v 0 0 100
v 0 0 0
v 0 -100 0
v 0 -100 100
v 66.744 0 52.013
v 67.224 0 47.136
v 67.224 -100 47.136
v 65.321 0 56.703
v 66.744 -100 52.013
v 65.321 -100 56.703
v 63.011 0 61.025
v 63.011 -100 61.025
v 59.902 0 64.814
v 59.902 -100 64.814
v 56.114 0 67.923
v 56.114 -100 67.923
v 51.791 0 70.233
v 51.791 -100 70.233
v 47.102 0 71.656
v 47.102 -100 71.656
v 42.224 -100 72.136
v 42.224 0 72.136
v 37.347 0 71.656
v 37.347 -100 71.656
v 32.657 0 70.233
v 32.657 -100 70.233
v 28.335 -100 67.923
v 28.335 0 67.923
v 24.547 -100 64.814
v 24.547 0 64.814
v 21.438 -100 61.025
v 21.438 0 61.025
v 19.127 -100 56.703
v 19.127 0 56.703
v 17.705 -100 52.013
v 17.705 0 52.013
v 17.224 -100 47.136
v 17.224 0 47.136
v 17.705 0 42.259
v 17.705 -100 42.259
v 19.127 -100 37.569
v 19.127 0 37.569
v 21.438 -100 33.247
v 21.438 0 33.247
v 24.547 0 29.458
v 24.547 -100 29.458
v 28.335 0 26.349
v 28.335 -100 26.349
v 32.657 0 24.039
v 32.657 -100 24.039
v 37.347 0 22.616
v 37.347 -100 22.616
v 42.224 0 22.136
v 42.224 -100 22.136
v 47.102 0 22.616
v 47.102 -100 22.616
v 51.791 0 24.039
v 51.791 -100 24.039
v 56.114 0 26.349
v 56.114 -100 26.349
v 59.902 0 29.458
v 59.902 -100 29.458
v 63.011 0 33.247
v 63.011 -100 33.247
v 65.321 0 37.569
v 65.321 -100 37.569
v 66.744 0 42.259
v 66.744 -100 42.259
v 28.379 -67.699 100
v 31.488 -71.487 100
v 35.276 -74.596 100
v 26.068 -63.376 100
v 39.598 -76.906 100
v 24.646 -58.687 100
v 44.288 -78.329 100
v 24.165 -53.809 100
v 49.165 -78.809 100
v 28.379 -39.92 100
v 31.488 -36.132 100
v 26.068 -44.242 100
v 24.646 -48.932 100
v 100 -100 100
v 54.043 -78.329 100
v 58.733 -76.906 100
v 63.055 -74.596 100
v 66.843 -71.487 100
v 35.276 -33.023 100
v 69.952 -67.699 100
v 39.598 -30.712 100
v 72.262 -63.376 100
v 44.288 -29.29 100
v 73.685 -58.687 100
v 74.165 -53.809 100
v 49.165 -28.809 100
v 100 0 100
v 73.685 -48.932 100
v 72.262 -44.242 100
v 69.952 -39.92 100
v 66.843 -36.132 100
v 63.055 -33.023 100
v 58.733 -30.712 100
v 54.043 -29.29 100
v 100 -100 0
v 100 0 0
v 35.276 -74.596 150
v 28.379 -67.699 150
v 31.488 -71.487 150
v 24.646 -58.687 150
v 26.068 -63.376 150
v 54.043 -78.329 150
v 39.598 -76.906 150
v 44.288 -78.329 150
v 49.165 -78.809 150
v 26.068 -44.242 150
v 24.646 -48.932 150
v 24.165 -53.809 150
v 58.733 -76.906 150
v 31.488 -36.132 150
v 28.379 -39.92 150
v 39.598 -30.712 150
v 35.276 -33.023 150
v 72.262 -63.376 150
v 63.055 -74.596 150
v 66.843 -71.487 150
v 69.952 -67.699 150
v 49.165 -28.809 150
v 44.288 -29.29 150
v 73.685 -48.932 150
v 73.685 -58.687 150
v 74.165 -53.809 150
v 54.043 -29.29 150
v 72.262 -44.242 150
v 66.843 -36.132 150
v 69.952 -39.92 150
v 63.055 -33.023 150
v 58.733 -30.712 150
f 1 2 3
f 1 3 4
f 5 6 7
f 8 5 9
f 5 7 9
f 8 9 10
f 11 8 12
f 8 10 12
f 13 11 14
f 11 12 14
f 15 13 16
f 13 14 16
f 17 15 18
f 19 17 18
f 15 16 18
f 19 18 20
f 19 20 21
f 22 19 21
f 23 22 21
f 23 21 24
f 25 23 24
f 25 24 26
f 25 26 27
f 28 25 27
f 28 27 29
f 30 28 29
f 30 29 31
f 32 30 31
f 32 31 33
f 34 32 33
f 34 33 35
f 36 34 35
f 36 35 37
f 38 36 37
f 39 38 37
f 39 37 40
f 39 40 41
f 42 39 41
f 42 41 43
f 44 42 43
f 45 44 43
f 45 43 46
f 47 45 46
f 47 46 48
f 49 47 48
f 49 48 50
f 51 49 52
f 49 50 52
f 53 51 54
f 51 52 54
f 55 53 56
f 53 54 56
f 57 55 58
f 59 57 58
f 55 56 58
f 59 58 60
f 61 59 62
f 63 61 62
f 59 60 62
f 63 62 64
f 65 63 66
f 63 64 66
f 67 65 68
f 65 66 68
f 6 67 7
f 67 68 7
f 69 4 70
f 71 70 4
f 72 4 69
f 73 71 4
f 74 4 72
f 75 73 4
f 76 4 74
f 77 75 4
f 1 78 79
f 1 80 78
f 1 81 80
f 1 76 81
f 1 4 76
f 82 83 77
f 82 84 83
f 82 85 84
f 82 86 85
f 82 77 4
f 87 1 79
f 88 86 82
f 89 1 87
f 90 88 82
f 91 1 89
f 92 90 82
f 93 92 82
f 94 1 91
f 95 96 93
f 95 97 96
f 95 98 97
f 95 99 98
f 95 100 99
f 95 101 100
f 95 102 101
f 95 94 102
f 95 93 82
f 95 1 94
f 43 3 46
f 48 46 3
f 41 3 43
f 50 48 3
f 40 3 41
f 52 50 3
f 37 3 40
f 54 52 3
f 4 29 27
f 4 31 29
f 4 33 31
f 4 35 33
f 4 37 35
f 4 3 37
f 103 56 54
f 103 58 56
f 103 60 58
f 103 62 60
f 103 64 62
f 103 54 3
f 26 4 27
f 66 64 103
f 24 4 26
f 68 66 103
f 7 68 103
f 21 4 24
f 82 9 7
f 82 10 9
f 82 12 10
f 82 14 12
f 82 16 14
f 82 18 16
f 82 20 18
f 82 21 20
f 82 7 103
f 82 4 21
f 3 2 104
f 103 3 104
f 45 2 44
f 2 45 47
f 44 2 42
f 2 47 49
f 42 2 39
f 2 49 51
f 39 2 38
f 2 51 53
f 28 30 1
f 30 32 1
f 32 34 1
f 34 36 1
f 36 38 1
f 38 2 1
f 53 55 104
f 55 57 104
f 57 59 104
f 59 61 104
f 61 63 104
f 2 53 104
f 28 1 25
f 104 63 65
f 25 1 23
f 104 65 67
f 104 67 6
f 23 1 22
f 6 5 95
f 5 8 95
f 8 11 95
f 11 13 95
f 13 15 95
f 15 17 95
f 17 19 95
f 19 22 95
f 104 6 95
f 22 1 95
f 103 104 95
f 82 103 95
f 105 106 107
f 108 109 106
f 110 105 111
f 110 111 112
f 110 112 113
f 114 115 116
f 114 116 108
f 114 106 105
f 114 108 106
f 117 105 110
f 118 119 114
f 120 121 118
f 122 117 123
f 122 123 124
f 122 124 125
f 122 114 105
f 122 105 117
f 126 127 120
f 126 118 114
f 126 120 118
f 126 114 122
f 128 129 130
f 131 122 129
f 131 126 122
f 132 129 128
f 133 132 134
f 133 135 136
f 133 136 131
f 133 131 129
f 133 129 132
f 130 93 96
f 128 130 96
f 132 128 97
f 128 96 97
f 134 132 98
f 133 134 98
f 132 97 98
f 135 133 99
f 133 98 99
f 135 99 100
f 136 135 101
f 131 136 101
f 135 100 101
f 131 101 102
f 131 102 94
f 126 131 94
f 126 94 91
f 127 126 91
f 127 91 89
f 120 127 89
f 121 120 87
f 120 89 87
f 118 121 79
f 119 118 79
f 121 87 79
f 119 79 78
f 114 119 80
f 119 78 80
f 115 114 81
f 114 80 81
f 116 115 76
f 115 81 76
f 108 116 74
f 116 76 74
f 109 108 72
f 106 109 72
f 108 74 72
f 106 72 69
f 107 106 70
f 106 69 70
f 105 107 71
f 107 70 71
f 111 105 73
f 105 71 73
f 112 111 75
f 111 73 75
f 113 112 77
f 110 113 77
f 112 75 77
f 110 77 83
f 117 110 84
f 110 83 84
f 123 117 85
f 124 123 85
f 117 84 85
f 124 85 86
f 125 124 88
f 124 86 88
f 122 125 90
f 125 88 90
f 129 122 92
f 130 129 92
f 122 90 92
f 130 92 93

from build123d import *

# Parameters (mm, degrees)
F0_W     = 100
F0_H     = 100
F1_DEPTH = 100
F4_R     = 25
F5_DEPTH = 50
F8_D     = 50


# Not quite as in the source:
# - the program builds the solid bodies; features that only make, move or delete a surface that nothing else refers to are left out


with BuildPart() as f1:
    # F0 (on Front) → F1 (new body)
    with BuildSketch(Plane.XZ):
        with Locations((50, 50)):
            Rectangle(F0_W, F0_H)
    extrude(amount=F1_DEPTH)

    # F4 (on face) → F5 (join)
    with BuildSketch(Plane.XY.offset(100)):
        with Locations((49.1654276848, -53.809389472)):
            Circle(F4_R)
    extrude(amount=F5_DEPTH)

    # F8 (through all)
    with Locations(Plane(origin=(0, 0, 0), x_dir=(-1, 0, 0), z_dir=(0, 1, 0))):
        with Locations((-42.2243028879, 47.1359044313)):
            Hole(F8_D / 2)


solid = f1.part
